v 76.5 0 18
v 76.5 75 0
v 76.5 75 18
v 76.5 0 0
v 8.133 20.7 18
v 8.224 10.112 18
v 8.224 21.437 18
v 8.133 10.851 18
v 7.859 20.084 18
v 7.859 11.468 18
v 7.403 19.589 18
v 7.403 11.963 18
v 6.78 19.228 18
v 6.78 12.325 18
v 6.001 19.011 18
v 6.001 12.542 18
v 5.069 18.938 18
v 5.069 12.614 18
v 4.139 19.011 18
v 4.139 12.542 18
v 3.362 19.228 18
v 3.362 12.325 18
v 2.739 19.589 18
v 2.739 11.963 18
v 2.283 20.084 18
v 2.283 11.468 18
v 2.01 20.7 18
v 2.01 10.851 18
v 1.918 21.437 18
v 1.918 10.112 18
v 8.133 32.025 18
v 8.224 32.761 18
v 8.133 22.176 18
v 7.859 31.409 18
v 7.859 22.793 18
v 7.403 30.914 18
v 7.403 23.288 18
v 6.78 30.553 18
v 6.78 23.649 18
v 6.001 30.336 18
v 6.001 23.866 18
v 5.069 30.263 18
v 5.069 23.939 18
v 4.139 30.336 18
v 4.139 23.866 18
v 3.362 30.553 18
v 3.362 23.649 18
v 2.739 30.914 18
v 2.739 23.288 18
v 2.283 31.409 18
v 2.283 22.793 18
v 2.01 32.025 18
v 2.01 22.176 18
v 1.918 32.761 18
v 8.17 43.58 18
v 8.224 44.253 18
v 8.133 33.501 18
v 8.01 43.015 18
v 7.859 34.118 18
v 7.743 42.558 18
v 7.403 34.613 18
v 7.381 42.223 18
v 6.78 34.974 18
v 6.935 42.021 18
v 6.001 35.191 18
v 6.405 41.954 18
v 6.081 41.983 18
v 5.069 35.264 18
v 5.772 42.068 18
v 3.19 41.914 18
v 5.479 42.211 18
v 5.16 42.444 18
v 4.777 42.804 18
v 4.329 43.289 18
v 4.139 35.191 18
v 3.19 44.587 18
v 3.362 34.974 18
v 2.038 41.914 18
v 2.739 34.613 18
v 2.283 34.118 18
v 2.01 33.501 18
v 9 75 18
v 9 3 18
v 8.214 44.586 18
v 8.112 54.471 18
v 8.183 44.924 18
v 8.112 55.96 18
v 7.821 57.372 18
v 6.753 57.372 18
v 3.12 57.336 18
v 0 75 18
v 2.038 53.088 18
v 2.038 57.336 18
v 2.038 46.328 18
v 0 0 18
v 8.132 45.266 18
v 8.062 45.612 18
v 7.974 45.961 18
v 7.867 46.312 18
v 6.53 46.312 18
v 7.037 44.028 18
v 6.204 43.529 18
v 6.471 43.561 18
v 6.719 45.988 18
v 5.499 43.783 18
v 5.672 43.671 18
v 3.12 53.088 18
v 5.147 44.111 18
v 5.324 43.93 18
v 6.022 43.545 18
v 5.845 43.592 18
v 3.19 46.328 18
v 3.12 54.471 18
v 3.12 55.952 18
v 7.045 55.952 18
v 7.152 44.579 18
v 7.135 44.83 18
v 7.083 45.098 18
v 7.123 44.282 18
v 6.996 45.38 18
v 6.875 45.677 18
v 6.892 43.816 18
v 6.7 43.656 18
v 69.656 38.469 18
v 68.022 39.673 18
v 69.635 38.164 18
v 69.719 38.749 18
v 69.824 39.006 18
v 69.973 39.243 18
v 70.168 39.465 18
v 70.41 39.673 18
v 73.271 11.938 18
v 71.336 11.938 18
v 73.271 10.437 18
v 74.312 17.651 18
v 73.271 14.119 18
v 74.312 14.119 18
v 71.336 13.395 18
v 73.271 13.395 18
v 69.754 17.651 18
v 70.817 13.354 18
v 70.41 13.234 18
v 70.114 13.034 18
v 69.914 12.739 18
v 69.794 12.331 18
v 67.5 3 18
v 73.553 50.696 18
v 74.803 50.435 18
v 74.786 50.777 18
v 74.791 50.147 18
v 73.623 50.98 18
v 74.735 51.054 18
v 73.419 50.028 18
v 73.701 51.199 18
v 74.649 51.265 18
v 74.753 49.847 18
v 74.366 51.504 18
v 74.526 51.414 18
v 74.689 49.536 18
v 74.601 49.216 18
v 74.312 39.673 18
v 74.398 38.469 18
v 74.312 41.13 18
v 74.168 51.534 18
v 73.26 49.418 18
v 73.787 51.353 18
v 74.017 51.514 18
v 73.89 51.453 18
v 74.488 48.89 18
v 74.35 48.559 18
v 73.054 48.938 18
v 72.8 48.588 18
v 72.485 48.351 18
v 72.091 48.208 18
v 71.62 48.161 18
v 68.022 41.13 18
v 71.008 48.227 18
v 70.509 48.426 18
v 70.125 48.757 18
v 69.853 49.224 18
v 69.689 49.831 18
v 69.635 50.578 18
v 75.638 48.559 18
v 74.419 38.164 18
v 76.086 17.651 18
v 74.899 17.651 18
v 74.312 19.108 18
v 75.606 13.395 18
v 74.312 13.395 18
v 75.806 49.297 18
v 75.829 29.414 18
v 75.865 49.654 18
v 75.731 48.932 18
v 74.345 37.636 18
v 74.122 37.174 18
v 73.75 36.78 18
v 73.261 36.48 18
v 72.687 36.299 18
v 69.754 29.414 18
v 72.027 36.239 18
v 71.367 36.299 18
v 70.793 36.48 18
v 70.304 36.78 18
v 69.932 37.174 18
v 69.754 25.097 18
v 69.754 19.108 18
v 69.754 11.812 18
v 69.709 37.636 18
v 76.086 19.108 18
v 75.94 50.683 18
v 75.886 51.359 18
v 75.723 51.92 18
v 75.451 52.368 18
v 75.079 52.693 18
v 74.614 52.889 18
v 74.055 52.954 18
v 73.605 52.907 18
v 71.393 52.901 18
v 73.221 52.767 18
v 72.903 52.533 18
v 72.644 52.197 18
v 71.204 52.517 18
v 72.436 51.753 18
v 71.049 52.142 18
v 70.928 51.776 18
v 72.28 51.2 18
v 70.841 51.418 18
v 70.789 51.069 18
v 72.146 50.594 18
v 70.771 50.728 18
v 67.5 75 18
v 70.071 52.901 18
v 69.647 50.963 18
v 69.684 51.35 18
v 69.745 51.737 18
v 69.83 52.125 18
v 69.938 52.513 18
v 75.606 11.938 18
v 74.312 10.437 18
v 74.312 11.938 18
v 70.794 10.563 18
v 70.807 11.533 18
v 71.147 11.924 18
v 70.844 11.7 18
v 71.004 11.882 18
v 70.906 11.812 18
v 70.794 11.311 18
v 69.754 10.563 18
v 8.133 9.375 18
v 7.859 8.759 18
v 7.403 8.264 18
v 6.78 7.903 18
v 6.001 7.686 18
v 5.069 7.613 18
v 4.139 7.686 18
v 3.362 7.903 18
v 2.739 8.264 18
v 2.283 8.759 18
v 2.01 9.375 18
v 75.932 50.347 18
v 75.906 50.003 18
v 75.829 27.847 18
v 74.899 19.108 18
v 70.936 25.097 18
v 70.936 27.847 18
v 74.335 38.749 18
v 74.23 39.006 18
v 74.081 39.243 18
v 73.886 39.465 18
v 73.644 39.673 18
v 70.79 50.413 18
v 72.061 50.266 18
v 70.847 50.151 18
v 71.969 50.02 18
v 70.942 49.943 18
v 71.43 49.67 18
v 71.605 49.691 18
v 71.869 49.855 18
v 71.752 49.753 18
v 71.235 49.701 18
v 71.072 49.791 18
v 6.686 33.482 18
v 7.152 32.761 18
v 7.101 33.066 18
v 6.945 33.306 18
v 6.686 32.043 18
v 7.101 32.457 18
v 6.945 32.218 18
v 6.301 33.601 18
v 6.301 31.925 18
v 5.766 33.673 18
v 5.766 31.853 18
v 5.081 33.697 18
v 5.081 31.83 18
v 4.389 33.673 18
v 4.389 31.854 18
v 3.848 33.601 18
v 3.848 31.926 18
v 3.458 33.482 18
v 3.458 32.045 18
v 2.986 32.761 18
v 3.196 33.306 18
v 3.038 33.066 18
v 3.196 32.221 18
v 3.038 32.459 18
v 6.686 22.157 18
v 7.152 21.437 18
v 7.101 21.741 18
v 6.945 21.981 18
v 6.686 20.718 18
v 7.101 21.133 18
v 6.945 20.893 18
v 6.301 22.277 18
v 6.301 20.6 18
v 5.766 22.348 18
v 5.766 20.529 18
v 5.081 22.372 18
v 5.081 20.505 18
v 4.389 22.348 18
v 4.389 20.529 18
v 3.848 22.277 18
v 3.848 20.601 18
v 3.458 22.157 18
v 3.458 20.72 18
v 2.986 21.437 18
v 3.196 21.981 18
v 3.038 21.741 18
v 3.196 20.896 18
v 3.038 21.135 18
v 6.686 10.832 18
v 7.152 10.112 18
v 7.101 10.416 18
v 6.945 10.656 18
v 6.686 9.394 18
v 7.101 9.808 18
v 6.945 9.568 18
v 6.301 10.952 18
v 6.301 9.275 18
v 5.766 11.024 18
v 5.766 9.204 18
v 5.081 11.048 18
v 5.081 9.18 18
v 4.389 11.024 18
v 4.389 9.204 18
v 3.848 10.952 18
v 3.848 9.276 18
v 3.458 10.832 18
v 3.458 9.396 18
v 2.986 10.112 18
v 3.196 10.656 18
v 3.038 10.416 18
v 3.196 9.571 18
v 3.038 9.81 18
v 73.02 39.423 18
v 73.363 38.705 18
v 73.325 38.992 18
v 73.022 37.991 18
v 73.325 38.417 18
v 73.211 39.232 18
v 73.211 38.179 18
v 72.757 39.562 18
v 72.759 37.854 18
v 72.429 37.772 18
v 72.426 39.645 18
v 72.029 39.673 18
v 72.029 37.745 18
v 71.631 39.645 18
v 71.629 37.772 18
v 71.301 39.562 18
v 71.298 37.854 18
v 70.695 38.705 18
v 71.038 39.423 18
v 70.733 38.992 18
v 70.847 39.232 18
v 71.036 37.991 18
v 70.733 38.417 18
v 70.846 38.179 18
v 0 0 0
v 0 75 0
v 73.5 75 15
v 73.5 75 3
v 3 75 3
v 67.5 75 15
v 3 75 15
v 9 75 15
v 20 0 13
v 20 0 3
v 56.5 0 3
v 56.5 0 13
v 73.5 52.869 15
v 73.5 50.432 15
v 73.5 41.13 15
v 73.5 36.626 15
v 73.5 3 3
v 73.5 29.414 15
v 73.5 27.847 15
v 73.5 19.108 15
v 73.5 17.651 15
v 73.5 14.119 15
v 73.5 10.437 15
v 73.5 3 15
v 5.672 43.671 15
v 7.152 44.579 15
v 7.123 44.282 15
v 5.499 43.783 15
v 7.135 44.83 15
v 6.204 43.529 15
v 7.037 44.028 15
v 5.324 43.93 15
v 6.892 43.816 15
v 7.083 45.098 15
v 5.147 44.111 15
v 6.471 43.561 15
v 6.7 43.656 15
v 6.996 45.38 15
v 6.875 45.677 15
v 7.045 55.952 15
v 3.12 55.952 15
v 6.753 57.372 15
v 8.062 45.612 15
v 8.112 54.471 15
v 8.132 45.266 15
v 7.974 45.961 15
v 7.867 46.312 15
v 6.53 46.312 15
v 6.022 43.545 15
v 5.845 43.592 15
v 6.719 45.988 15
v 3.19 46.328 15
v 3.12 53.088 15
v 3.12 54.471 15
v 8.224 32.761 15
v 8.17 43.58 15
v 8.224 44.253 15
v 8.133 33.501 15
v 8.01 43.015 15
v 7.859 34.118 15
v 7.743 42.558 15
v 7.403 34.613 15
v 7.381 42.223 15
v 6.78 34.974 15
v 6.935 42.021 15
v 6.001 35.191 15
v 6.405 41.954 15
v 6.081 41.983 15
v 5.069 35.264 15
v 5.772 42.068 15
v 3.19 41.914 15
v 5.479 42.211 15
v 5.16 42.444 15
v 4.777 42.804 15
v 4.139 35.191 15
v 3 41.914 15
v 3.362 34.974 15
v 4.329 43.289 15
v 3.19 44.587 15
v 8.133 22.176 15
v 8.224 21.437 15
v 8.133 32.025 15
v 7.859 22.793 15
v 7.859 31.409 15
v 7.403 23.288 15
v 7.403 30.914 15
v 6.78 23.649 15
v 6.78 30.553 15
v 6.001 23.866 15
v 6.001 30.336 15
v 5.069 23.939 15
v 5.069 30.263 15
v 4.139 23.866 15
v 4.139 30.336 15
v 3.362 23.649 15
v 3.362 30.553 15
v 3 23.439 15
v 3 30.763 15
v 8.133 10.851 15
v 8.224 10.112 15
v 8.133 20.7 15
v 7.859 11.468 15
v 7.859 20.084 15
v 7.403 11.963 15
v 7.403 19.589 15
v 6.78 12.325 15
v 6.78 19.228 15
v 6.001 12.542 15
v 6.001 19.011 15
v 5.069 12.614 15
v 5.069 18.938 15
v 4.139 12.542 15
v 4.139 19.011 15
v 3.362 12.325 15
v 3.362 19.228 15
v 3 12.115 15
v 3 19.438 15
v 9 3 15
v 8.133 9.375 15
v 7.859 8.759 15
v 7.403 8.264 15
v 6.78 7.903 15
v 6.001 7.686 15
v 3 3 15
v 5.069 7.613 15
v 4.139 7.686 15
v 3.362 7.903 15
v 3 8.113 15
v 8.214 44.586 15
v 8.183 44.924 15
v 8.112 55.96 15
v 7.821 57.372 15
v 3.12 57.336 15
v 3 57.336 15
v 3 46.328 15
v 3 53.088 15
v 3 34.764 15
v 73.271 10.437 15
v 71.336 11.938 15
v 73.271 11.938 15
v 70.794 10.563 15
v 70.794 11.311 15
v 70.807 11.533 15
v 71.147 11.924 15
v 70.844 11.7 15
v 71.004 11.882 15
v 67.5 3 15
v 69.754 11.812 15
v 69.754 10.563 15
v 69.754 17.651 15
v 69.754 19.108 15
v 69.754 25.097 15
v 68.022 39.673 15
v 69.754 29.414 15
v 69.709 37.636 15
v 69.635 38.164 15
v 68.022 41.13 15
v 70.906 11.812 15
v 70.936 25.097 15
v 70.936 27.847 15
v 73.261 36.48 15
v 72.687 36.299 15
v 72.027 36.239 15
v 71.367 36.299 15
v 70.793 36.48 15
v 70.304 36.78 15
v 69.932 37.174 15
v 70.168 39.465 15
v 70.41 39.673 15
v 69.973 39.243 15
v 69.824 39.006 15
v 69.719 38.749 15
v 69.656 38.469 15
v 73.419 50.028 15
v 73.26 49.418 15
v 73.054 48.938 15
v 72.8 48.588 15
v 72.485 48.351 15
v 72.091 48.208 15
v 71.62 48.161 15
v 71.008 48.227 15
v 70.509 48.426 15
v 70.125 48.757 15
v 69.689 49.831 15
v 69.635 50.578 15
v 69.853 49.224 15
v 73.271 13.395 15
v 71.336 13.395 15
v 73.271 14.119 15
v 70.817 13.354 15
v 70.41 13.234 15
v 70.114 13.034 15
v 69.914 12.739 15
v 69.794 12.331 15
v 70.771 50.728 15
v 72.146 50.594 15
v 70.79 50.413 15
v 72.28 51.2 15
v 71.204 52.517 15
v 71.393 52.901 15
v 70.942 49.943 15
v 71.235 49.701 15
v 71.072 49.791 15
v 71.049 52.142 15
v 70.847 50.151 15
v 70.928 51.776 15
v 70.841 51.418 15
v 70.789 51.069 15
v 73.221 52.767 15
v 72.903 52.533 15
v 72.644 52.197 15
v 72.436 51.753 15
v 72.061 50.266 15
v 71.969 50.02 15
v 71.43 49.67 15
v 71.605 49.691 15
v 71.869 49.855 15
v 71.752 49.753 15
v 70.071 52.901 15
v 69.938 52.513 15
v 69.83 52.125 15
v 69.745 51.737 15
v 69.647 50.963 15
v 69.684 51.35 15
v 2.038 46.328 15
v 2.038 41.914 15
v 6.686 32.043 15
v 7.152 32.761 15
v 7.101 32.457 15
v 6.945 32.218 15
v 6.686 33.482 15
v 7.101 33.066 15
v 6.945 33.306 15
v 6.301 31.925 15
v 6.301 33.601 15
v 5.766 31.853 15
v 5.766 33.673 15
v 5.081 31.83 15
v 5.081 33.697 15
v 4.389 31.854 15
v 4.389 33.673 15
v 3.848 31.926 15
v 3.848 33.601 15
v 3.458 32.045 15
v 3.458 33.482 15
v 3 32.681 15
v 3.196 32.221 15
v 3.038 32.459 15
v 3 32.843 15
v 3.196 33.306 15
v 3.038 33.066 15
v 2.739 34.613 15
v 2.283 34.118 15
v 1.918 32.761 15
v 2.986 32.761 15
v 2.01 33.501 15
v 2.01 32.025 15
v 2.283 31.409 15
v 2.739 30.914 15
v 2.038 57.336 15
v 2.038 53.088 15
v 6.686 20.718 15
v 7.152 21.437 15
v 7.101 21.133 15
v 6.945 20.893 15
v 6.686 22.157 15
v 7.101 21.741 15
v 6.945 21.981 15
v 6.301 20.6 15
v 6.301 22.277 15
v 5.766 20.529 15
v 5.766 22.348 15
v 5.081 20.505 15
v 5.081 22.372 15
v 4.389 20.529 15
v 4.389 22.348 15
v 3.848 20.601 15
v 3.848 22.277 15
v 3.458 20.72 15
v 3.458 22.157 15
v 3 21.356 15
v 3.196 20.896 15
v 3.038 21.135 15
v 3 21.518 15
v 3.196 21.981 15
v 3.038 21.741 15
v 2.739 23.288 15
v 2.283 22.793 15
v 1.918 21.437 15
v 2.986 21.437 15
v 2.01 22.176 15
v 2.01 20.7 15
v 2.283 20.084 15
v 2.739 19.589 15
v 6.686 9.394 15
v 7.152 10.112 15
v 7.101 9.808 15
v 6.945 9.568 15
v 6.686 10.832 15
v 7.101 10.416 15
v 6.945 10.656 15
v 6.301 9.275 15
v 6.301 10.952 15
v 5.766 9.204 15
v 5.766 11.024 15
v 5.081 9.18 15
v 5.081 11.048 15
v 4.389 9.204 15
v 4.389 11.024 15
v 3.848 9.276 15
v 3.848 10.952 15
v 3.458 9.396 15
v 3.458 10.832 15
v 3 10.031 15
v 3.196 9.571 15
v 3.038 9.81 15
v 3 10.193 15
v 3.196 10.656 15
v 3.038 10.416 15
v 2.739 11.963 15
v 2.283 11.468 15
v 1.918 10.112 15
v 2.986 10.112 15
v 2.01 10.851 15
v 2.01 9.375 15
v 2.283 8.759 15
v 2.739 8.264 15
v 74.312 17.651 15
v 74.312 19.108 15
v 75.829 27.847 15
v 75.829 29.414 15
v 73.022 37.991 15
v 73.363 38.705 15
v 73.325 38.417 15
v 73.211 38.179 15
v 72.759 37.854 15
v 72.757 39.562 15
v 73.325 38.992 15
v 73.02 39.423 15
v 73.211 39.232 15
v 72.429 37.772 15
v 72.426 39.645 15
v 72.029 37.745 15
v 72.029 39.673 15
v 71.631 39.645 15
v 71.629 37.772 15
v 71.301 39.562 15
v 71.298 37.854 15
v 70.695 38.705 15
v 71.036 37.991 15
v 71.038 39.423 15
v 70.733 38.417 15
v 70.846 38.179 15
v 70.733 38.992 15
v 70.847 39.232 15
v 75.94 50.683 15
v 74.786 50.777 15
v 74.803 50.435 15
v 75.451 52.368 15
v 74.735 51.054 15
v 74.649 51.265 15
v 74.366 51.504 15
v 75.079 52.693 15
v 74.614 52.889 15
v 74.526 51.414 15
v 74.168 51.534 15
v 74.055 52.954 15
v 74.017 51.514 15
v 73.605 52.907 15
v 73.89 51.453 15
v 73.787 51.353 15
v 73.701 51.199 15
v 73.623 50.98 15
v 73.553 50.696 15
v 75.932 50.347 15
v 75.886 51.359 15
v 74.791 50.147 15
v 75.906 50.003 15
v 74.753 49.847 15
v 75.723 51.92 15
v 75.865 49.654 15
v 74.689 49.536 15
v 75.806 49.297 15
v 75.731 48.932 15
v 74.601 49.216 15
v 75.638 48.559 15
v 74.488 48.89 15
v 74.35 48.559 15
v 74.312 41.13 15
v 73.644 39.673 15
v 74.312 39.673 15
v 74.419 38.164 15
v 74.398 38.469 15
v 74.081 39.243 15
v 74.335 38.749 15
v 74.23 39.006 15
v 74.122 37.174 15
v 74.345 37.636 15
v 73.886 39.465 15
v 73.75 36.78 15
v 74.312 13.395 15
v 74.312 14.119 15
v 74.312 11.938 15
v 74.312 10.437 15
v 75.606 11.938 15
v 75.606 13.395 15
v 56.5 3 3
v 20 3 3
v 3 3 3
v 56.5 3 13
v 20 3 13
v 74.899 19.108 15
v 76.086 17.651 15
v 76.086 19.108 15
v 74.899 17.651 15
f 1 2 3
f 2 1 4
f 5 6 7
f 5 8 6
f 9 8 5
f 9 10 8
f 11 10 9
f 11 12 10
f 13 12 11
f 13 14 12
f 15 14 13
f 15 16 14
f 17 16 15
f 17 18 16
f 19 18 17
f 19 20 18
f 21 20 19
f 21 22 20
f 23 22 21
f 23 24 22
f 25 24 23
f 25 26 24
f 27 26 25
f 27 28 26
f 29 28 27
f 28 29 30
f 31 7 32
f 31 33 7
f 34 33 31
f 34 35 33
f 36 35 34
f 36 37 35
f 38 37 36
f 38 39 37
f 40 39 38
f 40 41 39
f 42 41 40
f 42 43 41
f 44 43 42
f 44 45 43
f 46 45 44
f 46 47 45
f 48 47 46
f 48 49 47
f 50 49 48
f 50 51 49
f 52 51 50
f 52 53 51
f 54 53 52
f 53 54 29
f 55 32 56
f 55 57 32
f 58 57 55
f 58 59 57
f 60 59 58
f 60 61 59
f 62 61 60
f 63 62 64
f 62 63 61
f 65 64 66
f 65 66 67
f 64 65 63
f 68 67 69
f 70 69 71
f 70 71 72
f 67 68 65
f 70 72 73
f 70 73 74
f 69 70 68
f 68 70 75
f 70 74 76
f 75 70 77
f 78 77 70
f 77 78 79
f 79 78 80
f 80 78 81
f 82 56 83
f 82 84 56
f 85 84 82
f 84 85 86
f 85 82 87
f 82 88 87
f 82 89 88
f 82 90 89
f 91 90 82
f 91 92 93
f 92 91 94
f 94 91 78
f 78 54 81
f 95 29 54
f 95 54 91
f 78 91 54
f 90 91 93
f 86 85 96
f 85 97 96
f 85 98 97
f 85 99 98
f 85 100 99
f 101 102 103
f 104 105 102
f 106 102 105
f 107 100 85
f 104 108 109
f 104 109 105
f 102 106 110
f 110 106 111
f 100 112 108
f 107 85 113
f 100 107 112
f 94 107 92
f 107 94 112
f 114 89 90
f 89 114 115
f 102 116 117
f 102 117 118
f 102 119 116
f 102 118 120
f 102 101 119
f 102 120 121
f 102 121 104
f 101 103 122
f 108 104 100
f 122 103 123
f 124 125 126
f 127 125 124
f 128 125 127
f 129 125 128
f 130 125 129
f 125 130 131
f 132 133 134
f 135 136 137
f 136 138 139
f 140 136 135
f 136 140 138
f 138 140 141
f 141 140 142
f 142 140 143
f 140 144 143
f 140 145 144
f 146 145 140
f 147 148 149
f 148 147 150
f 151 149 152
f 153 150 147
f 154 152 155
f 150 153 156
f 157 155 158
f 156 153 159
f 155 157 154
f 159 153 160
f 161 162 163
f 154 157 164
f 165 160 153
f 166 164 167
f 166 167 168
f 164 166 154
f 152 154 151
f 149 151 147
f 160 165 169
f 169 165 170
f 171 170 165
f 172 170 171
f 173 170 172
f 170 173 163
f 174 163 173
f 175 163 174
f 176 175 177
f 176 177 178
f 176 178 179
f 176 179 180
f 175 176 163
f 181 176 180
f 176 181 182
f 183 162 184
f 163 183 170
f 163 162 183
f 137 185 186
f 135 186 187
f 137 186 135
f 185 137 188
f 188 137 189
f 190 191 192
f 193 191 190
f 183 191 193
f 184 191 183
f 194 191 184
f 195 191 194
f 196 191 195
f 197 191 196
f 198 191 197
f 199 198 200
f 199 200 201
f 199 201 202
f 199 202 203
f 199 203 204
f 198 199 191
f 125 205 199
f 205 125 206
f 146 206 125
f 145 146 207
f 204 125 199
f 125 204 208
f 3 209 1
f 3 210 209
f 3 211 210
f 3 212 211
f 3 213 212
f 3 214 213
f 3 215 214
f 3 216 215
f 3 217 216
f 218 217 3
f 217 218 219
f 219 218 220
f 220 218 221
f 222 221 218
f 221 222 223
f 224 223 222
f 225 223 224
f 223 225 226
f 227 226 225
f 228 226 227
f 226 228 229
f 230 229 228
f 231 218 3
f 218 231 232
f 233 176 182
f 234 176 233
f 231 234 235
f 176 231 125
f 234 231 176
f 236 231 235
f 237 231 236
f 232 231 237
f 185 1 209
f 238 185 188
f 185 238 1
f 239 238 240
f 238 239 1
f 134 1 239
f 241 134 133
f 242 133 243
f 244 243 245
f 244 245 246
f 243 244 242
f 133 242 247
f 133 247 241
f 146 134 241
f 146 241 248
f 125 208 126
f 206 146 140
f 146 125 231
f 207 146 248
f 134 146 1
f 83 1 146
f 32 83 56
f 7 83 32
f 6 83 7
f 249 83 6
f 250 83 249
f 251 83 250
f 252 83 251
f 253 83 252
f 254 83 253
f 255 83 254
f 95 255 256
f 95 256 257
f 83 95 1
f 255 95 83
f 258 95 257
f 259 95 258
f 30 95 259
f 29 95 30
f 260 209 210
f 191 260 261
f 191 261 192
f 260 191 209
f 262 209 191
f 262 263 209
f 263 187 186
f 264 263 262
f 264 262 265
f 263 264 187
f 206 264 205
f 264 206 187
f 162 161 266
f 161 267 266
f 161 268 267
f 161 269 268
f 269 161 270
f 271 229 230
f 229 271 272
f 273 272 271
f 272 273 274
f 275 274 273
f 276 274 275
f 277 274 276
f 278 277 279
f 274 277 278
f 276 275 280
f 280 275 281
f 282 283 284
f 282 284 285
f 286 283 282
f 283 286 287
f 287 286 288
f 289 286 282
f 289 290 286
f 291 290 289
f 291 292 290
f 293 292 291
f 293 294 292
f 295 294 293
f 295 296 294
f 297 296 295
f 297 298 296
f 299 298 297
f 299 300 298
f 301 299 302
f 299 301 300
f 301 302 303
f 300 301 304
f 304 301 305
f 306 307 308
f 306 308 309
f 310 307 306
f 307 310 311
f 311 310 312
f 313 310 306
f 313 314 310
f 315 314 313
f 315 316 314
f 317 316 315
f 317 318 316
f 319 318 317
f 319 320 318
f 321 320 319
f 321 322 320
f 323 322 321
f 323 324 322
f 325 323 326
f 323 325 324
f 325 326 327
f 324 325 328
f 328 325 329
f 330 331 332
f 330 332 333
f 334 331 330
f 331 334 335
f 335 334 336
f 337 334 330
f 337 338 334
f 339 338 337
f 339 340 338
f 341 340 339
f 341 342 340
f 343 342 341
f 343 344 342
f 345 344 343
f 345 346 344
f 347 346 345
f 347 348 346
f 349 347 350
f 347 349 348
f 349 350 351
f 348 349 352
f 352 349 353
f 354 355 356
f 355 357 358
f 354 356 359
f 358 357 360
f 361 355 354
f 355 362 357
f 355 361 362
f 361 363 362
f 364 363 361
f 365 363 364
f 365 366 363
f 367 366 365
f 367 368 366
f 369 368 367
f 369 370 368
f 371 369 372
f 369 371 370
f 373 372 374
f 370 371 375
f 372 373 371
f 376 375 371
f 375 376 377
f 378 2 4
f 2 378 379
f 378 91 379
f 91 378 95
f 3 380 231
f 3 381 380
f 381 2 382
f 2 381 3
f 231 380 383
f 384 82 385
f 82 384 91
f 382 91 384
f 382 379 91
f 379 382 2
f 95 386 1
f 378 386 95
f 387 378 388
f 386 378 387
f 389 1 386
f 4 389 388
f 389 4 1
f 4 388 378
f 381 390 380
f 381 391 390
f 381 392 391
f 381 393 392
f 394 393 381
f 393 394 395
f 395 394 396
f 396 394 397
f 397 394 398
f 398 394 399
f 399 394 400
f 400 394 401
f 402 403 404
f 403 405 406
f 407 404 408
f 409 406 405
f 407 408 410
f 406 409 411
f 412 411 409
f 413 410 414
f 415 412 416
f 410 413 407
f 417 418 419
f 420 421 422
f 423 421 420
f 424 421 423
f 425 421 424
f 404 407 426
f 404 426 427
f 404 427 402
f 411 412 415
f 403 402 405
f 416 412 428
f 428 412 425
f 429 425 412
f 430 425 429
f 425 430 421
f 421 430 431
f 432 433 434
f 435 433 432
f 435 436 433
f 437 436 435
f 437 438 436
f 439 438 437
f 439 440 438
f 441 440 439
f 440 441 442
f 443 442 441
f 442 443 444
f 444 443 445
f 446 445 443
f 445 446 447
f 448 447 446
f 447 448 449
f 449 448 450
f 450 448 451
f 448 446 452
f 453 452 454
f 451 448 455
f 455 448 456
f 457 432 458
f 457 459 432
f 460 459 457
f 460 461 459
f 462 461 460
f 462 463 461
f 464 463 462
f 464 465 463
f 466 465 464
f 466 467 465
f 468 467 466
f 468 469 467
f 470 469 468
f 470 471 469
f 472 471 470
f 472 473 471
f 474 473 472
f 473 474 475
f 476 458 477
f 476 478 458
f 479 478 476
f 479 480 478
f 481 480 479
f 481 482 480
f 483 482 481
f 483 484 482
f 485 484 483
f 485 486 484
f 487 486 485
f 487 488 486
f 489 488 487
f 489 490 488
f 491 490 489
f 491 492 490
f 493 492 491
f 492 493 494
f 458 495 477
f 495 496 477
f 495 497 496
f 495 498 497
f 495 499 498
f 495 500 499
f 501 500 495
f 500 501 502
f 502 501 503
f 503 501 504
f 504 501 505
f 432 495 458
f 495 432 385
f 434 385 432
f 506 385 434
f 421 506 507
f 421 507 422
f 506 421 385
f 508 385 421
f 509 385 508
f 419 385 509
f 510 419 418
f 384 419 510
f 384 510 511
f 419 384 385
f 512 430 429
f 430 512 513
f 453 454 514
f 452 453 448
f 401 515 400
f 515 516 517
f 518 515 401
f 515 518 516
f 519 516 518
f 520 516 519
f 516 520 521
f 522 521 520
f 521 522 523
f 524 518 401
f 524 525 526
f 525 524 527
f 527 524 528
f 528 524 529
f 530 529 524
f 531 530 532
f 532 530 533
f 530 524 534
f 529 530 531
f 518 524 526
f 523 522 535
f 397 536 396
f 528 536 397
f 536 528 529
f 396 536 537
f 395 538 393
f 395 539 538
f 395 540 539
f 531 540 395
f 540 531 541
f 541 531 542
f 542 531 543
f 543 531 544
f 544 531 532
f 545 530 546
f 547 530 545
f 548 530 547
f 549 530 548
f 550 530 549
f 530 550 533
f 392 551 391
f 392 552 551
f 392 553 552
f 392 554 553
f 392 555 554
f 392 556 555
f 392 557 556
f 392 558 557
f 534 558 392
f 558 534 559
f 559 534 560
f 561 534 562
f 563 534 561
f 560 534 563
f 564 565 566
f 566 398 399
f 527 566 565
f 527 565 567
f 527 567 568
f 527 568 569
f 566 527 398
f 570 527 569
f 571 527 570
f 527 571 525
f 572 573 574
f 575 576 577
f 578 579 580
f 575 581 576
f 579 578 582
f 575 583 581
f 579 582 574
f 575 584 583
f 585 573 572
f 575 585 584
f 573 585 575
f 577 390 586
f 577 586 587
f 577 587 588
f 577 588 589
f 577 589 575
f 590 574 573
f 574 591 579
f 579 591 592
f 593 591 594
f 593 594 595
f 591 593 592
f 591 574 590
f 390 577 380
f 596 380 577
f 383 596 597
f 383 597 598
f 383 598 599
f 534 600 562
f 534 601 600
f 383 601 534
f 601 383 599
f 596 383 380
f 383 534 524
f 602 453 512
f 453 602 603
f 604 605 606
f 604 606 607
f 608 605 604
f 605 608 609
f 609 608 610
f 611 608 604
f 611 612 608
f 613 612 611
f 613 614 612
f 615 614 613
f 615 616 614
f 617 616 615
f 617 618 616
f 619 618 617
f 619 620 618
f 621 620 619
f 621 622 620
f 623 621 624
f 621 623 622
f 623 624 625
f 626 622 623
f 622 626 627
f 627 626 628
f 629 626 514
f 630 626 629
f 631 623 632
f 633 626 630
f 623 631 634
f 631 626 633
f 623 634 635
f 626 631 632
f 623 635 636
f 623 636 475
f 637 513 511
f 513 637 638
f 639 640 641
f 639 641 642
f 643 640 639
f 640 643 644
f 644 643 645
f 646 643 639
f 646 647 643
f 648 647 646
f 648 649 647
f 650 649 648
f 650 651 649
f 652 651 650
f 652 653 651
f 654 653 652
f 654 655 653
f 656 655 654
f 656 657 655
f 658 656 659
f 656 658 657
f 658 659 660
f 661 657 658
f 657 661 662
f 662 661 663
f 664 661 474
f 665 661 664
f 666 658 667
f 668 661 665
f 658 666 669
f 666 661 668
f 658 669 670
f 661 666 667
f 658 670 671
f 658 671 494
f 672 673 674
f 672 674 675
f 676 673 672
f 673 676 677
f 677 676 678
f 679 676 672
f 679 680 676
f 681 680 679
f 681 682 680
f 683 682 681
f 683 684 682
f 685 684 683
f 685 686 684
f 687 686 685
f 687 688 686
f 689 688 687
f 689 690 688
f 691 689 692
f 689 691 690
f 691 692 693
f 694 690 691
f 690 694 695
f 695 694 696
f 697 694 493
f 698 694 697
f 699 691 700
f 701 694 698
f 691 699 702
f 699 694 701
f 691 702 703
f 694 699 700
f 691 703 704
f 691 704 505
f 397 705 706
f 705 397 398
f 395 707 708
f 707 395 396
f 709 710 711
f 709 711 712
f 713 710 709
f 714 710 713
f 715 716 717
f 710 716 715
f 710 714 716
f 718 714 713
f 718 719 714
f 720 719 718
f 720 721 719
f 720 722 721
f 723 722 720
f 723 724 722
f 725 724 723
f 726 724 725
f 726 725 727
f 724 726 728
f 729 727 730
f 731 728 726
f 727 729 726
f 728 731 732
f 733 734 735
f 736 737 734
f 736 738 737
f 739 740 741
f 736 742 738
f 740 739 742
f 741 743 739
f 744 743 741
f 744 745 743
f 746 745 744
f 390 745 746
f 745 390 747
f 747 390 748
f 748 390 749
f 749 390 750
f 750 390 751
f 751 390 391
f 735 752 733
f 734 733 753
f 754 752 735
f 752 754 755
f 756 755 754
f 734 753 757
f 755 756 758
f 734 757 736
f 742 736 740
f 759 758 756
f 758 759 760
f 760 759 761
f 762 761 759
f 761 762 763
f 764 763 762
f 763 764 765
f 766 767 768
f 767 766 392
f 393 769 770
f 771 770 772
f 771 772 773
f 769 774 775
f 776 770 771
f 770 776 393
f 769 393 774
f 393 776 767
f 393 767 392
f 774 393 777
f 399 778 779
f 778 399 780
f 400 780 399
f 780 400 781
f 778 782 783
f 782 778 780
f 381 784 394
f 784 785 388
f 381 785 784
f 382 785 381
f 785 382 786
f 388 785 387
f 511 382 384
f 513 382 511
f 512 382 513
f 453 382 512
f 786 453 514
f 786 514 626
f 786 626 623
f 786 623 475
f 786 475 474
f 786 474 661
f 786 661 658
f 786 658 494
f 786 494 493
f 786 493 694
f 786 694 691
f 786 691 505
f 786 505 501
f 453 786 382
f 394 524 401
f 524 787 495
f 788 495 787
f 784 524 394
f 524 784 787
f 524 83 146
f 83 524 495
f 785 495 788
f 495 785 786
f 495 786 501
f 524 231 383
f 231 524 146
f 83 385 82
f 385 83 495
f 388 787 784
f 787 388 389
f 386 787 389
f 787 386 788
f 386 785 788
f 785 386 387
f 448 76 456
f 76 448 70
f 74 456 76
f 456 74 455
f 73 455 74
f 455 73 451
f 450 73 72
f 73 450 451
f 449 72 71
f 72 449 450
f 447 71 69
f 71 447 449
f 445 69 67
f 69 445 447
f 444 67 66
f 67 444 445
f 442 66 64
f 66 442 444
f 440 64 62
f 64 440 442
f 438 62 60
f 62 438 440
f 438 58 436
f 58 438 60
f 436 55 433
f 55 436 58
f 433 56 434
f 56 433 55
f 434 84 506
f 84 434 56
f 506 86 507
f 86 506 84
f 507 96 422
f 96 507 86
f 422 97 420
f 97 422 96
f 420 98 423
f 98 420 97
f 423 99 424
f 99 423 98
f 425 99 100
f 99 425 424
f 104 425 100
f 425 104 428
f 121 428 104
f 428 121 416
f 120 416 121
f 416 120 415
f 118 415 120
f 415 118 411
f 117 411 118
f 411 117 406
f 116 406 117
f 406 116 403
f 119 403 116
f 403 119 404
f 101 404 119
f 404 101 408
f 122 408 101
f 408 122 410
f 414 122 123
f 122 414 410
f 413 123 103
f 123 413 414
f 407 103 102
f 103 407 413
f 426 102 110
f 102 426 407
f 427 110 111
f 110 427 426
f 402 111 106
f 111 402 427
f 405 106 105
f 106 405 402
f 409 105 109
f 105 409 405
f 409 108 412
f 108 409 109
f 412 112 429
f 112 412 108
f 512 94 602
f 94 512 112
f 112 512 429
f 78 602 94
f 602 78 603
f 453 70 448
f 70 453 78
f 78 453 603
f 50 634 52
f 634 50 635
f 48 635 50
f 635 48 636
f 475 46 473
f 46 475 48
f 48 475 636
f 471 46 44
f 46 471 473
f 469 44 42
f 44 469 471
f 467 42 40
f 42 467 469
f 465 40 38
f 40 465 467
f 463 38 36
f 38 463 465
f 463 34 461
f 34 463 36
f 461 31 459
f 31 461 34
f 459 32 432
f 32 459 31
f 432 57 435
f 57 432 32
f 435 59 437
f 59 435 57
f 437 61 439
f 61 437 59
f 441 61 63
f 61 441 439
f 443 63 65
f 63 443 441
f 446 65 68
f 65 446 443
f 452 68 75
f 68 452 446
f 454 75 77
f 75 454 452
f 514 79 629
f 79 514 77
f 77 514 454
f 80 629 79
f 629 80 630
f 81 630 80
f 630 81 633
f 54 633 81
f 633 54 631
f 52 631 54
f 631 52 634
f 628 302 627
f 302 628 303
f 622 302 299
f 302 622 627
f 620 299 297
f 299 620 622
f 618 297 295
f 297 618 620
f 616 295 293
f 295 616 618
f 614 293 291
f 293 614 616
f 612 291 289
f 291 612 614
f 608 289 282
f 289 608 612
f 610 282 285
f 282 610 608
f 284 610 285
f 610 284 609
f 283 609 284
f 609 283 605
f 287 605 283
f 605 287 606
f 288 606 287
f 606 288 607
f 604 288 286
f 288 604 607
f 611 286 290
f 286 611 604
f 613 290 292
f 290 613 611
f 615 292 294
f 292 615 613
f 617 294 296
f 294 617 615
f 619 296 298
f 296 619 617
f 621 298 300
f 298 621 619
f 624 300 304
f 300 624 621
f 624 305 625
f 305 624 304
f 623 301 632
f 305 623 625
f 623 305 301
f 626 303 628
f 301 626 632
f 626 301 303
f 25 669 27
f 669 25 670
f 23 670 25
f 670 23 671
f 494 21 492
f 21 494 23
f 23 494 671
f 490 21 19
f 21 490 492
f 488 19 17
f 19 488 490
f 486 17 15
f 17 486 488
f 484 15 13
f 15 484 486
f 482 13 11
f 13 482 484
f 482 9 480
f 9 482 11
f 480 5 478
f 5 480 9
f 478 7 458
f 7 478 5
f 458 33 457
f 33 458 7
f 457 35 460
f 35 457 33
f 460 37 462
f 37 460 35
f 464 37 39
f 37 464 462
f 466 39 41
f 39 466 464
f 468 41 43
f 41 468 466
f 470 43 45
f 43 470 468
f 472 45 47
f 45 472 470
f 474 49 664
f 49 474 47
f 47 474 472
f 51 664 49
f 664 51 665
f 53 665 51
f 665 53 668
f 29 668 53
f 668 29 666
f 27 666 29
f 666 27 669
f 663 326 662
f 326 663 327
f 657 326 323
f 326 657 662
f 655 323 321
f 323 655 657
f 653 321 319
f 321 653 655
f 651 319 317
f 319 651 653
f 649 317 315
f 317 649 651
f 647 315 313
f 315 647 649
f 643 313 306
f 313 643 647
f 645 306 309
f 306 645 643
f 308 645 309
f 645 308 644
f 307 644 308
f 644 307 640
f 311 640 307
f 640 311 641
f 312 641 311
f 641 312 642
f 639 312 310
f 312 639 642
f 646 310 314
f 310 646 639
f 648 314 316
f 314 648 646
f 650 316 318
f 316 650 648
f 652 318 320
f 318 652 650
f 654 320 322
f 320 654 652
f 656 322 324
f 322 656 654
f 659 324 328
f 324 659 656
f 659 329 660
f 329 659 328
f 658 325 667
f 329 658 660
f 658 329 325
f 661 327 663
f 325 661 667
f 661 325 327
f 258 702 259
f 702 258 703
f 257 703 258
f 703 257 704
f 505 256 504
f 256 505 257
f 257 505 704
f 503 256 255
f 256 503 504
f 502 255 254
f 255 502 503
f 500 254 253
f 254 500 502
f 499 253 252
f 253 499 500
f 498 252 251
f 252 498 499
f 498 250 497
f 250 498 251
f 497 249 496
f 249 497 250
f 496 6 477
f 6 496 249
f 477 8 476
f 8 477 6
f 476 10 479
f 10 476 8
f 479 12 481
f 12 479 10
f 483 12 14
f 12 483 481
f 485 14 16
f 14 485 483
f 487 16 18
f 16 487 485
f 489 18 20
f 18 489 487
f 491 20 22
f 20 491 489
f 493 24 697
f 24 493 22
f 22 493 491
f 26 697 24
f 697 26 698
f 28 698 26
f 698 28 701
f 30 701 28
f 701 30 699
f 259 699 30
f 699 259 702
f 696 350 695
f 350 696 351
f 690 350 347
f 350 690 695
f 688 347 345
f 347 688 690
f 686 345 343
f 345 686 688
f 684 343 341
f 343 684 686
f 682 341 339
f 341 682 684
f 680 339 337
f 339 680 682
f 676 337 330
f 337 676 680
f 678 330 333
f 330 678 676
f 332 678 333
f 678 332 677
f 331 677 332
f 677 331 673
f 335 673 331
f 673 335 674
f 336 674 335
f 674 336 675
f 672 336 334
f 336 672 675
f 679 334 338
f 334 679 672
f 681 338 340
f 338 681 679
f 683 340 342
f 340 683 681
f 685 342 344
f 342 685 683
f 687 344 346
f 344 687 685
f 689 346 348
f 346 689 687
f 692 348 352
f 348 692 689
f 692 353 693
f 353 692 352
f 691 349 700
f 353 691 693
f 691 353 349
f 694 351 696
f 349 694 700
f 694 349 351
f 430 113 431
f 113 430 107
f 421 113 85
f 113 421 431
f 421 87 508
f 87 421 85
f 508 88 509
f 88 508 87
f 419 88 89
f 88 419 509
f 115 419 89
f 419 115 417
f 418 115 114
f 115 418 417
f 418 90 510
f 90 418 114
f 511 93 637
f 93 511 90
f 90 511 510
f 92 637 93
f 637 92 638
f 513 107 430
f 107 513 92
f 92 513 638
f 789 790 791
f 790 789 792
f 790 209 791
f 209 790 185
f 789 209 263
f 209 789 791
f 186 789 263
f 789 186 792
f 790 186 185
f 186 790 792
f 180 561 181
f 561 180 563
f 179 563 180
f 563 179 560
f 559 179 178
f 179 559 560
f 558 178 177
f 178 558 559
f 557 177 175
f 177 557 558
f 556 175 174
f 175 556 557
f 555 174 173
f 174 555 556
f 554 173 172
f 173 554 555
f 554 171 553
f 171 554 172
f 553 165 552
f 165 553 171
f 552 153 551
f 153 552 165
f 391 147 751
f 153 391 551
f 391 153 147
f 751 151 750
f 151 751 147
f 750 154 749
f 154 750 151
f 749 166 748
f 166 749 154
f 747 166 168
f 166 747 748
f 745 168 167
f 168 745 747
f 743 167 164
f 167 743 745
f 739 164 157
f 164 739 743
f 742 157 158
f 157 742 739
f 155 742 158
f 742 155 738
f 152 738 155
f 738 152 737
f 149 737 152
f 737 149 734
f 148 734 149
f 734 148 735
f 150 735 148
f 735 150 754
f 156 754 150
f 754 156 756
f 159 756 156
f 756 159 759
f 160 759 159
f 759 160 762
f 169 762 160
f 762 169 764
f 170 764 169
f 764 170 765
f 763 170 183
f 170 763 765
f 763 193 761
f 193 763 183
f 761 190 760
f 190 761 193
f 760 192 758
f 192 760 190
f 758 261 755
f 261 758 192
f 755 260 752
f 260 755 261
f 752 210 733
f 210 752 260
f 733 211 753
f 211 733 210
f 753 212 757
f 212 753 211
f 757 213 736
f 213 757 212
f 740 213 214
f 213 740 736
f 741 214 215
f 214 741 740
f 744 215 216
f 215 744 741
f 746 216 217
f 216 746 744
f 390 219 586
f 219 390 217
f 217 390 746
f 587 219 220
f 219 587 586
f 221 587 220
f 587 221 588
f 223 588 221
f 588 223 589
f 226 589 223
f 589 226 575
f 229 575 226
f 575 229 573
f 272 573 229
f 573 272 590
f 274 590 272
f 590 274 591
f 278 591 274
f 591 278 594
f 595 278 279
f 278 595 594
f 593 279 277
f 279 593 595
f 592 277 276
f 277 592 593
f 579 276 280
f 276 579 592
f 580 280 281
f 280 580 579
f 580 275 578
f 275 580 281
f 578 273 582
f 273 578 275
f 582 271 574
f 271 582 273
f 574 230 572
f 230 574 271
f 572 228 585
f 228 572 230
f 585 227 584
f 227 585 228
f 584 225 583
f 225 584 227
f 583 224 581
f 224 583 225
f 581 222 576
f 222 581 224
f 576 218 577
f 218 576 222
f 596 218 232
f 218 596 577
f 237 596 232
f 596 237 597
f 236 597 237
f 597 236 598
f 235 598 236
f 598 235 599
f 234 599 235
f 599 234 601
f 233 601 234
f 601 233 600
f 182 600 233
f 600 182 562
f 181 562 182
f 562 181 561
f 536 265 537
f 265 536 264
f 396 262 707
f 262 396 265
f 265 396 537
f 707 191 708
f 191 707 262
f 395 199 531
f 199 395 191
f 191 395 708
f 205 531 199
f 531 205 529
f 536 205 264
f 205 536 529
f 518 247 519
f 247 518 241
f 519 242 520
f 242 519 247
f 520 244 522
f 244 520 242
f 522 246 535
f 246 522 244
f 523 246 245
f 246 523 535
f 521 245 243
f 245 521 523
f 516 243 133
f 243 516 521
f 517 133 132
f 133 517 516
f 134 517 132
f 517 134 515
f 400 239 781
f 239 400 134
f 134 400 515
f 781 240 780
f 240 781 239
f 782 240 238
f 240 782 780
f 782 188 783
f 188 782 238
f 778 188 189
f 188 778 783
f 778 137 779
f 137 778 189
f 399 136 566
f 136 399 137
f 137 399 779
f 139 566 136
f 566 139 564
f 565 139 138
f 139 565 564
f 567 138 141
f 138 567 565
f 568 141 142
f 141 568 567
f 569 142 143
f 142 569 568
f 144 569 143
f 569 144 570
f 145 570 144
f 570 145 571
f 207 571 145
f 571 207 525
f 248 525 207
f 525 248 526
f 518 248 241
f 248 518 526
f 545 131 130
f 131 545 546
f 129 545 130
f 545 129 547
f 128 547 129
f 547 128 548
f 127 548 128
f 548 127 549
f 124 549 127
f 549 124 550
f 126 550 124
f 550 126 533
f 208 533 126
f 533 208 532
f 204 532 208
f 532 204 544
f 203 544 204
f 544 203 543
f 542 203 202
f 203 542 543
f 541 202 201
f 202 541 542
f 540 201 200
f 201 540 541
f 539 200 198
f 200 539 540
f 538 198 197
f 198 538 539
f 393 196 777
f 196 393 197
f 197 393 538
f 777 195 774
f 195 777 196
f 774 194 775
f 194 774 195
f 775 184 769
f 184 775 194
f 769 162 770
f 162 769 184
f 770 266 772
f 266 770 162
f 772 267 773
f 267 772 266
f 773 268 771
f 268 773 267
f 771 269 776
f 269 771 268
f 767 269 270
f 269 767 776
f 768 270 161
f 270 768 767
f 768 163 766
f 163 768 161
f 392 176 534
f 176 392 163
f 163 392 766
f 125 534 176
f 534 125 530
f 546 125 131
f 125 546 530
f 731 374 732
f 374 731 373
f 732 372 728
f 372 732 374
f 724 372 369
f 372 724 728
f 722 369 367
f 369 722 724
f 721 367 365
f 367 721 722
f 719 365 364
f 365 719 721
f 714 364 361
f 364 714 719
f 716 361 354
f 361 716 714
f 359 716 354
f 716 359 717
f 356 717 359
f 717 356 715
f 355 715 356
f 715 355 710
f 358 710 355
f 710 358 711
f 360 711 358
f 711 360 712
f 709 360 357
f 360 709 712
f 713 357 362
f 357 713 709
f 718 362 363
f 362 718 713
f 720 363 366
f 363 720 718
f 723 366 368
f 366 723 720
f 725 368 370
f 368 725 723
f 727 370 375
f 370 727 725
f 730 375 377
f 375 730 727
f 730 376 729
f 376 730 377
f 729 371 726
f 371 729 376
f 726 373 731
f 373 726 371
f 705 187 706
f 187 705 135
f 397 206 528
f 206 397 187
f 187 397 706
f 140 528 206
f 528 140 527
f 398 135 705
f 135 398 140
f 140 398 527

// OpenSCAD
//Moto G phone case for FTC
//Alissa Jurisch
//11/16/2017
//rev 1

//FTC team number
Team = 12000; //your team number
//your team name
TeamName="SpLit"; //your team name
 //65 gives you just over the 2.5 inches necessary for rules
height = 6; //65 gives you just over the 2.5 inches necessary for rules


difference(){
cube([76.5,75,18]); //main box
    translate([3,3,3]) {
cube([70.5,97,12]); //subtracts phone
    }
    translate([9,3,6]){
cube([58.5,97,15]); //creates opening    
    }
    translate([20,-3,3]){
        cube([36.5,12,10]);
    }

translate ([5,30,15]){
linear_extrude(3) {
        rotate(270,0,0){
		text(str(Team),size=height, font="Ariel:Bold", halign = "center", valign = "center", spacing = 2);
                }
        }
    }

translate ([72,30,15]){
linear_extrude(3) {
        rotate(270,0,0){
		text(str(TeamName),size=height, font="Ariel:Bold", halign = "center", valign = "center", spacing = 2);
            }
        }   
    }
}
